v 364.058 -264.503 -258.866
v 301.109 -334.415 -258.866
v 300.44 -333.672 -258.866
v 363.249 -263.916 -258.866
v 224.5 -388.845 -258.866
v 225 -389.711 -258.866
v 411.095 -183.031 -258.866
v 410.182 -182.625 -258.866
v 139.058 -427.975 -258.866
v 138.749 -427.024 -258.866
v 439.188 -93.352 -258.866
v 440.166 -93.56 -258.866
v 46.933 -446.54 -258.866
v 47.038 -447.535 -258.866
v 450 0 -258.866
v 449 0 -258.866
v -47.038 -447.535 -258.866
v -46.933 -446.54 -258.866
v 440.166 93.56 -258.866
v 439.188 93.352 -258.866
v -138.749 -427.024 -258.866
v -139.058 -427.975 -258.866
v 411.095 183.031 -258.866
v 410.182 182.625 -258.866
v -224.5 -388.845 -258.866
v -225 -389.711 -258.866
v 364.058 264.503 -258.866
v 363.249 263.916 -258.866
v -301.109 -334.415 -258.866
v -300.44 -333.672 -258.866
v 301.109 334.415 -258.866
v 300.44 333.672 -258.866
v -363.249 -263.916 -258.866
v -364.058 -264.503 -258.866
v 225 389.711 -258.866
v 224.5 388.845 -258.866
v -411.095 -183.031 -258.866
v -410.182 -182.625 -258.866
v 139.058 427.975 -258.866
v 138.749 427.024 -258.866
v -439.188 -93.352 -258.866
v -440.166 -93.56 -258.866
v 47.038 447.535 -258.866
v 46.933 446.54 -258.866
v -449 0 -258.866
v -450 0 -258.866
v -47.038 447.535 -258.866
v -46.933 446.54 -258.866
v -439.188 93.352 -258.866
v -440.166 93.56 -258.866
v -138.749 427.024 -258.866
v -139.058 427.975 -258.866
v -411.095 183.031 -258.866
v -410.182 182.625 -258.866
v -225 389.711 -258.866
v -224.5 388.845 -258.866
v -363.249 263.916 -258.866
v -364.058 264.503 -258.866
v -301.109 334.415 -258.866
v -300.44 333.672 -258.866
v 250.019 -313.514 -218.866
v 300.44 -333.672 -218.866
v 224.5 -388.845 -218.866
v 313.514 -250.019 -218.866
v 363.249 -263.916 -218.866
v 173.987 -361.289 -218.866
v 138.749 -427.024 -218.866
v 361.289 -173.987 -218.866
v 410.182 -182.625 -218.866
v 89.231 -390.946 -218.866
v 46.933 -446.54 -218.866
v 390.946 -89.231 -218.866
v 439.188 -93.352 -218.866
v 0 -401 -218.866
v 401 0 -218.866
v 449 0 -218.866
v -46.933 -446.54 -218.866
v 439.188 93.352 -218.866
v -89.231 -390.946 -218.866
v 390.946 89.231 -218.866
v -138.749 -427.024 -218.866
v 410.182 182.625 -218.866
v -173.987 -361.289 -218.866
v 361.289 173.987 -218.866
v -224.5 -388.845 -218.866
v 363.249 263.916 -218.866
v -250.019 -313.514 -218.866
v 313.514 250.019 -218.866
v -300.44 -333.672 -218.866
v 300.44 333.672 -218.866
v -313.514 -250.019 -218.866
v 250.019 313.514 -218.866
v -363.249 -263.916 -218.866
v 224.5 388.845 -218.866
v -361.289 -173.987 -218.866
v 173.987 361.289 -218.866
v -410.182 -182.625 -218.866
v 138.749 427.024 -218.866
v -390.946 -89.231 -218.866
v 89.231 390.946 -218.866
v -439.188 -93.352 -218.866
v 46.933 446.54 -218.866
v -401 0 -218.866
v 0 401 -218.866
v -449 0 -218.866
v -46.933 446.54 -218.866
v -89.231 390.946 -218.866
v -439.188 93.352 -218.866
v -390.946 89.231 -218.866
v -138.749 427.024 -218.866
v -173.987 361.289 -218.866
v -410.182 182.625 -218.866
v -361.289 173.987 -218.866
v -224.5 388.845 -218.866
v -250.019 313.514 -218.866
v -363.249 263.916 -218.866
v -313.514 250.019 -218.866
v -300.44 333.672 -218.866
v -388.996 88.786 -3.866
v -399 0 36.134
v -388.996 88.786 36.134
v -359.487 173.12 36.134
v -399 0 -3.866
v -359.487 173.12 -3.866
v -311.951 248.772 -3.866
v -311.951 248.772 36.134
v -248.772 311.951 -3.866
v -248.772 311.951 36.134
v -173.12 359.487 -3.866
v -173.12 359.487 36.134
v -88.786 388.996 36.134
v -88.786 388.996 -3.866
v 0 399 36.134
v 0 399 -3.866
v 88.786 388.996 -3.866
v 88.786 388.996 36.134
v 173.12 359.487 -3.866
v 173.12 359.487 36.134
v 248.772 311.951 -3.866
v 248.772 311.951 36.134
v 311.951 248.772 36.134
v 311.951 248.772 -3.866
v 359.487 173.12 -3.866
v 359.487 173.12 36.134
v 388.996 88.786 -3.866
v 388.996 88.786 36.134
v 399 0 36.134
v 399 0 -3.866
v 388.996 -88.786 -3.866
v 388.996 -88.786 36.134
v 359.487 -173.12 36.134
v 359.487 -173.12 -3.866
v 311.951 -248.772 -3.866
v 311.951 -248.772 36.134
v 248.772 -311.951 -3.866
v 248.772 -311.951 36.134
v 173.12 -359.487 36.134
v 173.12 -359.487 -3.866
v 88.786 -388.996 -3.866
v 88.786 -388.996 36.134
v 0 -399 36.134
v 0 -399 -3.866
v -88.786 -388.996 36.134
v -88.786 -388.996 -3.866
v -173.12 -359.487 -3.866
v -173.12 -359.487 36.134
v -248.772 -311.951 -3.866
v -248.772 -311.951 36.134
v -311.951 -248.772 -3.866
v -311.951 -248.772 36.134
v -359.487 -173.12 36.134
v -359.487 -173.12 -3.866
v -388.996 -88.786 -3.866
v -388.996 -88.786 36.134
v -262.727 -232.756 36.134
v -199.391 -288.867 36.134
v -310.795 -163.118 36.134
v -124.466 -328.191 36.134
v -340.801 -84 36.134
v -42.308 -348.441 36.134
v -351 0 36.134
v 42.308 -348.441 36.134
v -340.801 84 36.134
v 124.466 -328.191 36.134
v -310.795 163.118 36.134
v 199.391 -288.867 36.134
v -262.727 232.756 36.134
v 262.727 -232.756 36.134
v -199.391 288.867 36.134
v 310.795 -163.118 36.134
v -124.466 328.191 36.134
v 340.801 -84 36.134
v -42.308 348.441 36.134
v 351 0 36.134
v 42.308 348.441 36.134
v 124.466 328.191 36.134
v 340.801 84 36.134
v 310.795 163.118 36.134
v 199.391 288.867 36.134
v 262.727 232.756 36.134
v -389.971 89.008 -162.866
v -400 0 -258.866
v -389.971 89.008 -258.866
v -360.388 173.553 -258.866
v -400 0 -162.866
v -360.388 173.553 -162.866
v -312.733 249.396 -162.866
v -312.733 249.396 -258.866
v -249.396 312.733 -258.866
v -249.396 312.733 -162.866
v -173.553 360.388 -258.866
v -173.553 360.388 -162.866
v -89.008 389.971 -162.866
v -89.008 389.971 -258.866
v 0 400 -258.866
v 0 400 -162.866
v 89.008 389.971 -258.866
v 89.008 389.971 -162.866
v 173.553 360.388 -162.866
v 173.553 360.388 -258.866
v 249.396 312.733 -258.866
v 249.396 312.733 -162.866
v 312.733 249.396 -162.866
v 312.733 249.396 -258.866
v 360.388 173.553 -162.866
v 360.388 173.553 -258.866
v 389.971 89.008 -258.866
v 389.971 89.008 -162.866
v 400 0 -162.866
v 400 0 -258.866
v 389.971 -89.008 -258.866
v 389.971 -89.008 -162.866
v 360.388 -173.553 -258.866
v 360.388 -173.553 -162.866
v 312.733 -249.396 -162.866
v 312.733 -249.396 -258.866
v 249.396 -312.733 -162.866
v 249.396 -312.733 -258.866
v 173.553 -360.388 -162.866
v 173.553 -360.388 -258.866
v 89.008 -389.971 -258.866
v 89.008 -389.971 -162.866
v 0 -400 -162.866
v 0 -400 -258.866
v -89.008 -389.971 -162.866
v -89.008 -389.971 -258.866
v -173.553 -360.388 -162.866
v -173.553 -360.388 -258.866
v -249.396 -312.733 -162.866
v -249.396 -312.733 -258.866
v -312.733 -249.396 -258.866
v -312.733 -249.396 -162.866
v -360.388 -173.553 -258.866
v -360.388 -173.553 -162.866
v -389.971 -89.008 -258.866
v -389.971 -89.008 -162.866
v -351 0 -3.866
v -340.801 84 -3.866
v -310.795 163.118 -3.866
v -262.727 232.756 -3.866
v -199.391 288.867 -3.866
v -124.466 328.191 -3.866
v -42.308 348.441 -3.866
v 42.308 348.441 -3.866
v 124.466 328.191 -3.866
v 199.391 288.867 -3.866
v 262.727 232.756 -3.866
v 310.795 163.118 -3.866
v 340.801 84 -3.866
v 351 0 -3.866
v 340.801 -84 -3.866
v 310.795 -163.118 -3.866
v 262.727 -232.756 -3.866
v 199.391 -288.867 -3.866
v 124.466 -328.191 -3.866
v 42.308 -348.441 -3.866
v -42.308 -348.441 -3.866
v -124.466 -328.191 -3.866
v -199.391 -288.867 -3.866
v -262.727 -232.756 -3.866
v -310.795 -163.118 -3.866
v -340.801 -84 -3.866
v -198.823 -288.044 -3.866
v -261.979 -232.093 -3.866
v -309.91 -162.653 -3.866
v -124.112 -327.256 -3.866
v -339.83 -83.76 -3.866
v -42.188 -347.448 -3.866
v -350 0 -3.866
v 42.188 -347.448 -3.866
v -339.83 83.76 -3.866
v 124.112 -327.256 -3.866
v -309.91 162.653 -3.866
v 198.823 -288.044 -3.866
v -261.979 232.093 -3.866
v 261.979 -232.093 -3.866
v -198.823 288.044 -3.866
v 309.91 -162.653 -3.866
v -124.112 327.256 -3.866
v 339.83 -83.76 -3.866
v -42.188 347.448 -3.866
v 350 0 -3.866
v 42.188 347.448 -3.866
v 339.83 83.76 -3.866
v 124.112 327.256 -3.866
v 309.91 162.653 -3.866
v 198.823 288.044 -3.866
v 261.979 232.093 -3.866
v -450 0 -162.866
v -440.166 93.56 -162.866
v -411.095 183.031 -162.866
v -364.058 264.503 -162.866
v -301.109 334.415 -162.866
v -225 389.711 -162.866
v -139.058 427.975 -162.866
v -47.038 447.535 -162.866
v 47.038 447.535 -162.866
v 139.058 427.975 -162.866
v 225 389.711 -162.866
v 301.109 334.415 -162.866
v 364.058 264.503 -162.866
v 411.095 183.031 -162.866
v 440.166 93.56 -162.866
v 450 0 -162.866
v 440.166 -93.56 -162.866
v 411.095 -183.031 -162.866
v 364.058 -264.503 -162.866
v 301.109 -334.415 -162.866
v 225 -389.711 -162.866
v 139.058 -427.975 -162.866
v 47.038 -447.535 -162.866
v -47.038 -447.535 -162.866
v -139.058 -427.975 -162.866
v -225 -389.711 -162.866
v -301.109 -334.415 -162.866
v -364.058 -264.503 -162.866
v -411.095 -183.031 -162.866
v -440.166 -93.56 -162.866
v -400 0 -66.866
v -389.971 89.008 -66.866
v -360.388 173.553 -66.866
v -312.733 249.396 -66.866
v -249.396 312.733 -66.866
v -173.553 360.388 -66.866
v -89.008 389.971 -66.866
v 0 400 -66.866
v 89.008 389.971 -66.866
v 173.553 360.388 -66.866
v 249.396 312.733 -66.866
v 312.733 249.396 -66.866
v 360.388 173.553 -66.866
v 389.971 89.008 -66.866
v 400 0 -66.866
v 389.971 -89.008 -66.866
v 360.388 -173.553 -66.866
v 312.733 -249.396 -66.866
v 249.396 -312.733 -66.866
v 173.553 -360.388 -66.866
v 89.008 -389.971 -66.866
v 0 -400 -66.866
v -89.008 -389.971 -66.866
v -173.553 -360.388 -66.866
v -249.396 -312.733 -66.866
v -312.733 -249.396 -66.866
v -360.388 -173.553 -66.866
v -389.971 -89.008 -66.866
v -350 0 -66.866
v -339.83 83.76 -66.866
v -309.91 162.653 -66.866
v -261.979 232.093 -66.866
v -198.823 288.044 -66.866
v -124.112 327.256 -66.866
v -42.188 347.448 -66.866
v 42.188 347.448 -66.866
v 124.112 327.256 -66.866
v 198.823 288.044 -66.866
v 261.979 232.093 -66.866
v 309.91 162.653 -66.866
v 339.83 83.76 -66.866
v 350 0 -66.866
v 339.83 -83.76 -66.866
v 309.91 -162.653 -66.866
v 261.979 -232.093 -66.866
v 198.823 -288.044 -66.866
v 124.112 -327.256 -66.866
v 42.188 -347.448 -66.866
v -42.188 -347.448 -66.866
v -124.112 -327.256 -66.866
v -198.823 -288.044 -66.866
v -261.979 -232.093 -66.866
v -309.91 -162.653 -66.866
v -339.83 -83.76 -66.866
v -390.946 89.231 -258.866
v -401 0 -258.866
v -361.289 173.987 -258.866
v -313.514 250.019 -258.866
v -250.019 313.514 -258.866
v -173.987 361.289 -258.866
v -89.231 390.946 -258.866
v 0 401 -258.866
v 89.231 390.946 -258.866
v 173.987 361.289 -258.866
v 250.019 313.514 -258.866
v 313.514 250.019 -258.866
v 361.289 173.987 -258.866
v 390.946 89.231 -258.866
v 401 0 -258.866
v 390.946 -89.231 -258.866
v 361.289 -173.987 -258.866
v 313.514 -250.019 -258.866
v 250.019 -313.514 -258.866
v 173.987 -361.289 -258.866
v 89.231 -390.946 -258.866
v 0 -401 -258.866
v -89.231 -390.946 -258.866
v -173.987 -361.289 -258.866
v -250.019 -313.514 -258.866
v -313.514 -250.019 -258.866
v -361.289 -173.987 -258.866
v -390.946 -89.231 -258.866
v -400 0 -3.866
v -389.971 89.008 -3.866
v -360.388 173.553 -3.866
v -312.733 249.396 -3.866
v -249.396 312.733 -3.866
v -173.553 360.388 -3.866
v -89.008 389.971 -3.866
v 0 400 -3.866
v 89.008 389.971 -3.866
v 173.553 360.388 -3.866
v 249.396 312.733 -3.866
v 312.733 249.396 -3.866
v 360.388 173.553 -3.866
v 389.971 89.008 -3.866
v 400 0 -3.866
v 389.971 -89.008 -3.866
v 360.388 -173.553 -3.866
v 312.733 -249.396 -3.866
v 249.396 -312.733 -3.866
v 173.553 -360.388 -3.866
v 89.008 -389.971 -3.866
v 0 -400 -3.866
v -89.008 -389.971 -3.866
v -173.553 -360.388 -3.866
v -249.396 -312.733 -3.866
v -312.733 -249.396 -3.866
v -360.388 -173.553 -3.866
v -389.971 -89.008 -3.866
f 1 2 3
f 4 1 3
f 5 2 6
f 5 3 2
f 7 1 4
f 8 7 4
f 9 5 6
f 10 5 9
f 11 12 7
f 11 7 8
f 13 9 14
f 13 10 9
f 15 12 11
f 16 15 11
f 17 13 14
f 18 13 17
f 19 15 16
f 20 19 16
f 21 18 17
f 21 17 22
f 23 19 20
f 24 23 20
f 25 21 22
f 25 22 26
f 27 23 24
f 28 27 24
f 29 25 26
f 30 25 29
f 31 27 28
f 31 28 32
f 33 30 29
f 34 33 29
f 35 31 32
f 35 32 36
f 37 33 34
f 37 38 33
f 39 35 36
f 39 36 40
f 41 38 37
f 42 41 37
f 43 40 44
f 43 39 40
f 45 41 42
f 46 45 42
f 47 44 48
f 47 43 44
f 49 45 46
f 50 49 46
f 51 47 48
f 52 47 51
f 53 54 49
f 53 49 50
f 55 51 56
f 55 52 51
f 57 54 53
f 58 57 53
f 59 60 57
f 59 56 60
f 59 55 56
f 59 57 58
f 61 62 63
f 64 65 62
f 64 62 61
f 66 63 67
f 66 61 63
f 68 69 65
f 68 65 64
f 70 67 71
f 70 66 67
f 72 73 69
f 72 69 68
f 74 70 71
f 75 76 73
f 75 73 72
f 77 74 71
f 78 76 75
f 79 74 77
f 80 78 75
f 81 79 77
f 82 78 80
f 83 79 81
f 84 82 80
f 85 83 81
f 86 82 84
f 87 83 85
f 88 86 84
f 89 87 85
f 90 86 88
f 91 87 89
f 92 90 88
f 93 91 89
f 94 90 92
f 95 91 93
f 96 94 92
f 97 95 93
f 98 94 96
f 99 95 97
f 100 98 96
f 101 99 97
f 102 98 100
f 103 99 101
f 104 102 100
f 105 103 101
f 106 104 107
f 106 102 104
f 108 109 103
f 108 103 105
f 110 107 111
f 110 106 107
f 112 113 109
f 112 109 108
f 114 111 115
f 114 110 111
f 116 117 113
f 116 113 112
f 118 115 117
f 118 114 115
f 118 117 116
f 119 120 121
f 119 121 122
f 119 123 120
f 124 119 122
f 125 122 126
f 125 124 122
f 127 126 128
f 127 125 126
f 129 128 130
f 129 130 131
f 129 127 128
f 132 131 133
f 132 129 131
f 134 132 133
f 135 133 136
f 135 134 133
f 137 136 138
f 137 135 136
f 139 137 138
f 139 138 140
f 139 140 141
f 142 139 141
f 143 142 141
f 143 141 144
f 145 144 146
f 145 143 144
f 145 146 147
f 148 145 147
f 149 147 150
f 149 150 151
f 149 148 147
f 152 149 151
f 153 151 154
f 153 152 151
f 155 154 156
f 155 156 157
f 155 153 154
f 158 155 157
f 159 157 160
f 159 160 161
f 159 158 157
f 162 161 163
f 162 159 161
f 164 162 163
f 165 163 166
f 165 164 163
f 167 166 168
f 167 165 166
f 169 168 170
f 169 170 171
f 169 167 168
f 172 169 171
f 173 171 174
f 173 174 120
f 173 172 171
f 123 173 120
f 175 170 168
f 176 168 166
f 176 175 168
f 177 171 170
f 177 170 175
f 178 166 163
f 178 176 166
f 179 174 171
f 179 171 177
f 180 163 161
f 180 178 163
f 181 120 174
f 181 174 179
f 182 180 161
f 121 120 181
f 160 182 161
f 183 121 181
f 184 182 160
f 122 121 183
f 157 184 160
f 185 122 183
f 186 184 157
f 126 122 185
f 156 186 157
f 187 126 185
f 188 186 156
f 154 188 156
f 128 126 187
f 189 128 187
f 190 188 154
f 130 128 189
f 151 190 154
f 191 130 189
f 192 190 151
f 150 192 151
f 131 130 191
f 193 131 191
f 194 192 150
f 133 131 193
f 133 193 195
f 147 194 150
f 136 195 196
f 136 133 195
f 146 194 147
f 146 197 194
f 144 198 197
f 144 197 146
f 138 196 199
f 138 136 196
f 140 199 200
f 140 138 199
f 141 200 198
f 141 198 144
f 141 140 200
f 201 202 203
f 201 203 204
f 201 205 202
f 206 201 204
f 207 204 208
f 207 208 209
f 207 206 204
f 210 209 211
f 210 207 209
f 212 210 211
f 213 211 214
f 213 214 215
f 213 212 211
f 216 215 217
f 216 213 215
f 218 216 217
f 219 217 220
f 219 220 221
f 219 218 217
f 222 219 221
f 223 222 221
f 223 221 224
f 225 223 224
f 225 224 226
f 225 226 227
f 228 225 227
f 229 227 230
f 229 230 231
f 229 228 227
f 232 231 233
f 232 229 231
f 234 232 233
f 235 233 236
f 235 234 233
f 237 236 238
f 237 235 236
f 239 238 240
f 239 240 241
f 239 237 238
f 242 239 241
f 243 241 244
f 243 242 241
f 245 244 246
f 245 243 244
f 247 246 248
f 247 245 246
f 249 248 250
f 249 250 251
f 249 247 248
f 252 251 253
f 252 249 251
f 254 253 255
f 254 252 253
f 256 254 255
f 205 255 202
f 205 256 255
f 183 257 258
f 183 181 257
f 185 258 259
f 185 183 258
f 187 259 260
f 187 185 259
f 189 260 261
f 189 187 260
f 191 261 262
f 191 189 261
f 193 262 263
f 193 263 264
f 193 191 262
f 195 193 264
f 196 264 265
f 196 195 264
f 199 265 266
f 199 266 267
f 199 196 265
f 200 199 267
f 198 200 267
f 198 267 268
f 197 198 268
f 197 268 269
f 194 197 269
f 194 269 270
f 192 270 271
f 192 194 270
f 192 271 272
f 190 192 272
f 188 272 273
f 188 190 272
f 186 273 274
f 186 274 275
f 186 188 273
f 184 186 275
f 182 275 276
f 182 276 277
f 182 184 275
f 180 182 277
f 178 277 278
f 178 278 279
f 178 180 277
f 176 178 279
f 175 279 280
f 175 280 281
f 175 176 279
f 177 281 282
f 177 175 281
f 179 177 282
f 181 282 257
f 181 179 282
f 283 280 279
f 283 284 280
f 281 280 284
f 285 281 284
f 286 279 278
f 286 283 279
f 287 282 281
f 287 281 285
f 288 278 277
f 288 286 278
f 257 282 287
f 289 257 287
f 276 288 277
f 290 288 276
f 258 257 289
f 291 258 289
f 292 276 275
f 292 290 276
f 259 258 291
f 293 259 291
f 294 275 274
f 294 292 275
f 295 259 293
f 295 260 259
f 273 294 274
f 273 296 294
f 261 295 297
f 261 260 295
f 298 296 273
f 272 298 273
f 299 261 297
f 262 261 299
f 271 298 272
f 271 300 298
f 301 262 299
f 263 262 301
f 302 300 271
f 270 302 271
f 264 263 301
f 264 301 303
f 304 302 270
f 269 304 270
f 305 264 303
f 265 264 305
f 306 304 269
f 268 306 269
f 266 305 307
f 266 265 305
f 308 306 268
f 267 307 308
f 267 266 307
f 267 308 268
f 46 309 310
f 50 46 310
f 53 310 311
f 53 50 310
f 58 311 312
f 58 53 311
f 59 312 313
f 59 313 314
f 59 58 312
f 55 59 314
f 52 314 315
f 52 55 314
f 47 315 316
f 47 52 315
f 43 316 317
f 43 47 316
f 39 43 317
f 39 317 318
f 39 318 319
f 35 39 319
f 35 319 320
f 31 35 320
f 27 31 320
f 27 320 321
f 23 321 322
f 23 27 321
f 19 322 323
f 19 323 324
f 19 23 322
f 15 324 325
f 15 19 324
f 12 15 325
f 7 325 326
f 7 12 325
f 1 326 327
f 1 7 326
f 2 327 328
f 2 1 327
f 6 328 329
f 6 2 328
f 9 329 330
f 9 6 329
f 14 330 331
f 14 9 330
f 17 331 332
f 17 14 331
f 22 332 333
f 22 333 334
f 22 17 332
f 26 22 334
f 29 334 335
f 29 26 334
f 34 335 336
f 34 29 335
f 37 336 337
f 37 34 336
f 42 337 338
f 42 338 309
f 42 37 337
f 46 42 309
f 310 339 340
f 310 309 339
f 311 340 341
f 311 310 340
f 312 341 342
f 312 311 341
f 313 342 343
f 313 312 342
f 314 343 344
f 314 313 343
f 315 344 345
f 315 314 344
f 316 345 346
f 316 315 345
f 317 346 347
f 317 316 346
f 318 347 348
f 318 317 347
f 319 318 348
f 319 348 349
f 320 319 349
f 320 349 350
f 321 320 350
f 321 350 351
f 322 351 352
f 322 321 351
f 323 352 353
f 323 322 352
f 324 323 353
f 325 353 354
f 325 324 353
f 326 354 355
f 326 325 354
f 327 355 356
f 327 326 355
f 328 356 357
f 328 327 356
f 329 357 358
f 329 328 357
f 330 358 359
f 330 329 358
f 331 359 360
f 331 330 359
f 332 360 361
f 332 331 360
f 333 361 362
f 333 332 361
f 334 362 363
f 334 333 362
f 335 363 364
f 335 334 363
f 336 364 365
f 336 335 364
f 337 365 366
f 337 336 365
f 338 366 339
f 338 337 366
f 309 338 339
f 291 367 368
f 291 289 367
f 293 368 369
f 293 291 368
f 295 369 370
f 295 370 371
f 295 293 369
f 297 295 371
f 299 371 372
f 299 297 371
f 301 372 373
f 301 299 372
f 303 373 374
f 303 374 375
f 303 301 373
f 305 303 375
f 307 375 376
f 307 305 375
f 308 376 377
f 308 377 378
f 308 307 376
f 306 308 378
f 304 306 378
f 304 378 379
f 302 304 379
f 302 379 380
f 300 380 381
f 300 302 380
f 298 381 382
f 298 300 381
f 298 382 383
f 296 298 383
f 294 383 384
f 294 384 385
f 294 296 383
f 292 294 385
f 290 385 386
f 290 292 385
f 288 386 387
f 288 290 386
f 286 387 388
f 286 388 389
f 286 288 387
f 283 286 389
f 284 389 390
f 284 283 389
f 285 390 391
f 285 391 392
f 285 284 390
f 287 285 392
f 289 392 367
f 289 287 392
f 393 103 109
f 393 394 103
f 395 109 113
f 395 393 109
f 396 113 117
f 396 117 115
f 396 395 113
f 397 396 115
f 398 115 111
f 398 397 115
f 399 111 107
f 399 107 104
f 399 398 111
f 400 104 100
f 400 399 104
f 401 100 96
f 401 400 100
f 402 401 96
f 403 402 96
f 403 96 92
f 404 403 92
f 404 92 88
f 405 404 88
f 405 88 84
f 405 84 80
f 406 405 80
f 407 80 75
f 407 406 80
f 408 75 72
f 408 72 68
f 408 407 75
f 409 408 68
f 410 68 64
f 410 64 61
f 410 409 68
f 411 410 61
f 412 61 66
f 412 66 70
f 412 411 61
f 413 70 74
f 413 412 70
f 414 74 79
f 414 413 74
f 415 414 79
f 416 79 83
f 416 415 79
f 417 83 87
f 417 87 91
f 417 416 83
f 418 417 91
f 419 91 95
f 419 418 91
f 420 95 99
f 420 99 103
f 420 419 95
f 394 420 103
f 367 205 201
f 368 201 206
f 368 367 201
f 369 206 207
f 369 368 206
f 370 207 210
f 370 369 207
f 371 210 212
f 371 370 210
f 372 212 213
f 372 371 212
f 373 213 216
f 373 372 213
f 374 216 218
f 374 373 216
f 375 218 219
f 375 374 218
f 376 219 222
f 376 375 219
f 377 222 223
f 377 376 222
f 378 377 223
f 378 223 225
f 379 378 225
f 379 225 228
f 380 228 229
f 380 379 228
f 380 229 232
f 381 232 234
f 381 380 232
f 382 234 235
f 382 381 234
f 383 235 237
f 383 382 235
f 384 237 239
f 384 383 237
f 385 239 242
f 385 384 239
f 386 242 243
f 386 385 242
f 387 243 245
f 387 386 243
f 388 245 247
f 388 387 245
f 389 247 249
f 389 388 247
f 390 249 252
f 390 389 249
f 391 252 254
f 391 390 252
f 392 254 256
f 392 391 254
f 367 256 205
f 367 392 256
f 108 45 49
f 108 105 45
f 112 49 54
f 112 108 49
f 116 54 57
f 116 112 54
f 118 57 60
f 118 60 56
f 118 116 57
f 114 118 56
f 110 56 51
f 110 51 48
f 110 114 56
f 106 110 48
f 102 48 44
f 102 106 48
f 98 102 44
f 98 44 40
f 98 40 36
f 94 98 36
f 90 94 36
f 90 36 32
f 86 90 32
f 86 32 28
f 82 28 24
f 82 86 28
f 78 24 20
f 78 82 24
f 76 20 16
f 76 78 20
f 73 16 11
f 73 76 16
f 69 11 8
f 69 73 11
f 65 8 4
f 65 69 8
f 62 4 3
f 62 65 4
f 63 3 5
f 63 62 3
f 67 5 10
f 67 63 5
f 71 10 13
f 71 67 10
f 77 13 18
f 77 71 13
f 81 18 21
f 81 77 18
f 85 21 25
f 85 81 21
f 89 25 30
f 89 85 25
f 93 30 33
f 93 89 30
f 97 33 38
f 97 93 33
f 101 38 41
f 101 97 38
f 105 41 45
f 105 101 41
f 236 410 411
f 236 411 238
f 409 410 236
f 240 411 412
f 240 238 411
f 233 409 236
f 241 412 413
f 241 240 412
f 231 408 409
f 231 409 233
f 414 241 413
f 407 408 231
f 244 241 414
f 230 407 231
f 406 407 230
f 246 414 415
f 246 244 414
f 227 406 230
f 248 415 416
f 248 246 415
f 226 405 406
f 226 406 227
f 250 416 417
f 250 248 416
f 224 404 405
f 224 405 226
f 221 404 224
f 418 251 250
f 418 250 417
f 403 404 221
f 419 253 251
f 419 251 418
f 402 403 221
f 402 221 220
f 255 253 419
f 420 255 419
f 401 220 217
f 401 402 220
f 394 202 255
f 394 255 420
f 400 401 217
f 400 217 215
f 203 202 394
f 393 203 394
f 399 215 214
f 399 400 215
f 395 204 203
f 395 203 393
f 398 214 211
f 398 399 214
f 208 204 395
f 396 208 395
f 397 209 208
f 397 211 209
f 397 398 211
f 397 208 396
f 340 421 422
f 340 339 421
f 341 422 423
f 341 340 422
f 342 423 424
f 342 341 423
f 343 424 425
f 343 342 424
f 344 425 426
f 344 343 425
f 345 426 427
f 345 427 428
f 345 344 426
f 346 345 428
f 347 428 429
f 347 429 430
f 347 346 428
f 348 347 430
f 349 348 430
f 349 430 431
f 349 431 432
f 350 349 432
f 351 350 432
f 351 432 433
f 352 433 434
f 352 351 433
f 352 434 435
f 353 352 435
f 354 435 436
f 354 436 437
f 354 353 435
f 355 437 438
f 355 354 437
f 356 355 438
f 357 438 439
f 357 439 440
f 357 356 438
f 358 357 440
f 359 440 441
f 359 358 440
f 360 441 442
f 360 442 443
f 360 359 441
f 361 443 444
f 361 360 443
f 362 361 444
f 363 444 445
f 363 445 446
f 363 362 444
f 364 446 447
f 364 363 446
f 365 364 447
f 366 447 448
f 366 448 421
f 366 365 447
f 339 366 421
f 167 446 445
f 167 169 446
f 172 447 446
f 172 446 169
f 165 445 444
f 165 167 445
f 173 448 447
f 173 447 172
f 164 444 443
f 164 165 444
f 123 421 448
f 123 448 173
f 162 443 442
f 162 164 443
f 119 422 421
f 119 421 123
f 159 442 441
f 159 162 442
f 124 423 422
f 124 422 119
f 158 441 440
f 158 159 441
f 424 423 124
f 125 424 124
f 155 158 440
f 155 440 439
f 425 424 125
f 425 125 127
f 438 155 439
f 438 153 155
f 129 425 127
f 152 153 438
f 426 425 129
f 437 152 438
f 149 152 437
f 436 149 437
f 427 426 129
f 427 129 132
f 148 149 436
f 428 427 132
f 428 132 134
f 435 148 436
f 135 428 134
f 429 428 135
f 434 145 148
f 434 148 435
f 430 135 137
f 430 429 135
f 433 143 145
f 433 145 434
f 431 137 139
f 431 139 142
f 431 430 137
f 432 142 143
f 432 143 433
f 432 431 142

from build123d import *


with BuildPart() as f1:
    # F0 (on Front) → F1 (revolve)
    with BuildSketch(Plane.XZ):
        Polygon((-401, -258.865593), (-400, -258.865593), (-400, -162.865593), (-350, -66.865593), (-350, -3.865593), (-351, -3.865593), (-351, 36.134407), (-399, 36.134407), (-399, -3.865593), (-400, -3.865593), (-400, -66.865593), (-450, -162.865593), (-450, -258.865593), (-449, -258.865593), (-449, -218.865593), (-401, -218.865593), align=None)
    revolve(axis=Axis((0, 0, -0.829662), (0, 0, -1)))


solid = f1.part
